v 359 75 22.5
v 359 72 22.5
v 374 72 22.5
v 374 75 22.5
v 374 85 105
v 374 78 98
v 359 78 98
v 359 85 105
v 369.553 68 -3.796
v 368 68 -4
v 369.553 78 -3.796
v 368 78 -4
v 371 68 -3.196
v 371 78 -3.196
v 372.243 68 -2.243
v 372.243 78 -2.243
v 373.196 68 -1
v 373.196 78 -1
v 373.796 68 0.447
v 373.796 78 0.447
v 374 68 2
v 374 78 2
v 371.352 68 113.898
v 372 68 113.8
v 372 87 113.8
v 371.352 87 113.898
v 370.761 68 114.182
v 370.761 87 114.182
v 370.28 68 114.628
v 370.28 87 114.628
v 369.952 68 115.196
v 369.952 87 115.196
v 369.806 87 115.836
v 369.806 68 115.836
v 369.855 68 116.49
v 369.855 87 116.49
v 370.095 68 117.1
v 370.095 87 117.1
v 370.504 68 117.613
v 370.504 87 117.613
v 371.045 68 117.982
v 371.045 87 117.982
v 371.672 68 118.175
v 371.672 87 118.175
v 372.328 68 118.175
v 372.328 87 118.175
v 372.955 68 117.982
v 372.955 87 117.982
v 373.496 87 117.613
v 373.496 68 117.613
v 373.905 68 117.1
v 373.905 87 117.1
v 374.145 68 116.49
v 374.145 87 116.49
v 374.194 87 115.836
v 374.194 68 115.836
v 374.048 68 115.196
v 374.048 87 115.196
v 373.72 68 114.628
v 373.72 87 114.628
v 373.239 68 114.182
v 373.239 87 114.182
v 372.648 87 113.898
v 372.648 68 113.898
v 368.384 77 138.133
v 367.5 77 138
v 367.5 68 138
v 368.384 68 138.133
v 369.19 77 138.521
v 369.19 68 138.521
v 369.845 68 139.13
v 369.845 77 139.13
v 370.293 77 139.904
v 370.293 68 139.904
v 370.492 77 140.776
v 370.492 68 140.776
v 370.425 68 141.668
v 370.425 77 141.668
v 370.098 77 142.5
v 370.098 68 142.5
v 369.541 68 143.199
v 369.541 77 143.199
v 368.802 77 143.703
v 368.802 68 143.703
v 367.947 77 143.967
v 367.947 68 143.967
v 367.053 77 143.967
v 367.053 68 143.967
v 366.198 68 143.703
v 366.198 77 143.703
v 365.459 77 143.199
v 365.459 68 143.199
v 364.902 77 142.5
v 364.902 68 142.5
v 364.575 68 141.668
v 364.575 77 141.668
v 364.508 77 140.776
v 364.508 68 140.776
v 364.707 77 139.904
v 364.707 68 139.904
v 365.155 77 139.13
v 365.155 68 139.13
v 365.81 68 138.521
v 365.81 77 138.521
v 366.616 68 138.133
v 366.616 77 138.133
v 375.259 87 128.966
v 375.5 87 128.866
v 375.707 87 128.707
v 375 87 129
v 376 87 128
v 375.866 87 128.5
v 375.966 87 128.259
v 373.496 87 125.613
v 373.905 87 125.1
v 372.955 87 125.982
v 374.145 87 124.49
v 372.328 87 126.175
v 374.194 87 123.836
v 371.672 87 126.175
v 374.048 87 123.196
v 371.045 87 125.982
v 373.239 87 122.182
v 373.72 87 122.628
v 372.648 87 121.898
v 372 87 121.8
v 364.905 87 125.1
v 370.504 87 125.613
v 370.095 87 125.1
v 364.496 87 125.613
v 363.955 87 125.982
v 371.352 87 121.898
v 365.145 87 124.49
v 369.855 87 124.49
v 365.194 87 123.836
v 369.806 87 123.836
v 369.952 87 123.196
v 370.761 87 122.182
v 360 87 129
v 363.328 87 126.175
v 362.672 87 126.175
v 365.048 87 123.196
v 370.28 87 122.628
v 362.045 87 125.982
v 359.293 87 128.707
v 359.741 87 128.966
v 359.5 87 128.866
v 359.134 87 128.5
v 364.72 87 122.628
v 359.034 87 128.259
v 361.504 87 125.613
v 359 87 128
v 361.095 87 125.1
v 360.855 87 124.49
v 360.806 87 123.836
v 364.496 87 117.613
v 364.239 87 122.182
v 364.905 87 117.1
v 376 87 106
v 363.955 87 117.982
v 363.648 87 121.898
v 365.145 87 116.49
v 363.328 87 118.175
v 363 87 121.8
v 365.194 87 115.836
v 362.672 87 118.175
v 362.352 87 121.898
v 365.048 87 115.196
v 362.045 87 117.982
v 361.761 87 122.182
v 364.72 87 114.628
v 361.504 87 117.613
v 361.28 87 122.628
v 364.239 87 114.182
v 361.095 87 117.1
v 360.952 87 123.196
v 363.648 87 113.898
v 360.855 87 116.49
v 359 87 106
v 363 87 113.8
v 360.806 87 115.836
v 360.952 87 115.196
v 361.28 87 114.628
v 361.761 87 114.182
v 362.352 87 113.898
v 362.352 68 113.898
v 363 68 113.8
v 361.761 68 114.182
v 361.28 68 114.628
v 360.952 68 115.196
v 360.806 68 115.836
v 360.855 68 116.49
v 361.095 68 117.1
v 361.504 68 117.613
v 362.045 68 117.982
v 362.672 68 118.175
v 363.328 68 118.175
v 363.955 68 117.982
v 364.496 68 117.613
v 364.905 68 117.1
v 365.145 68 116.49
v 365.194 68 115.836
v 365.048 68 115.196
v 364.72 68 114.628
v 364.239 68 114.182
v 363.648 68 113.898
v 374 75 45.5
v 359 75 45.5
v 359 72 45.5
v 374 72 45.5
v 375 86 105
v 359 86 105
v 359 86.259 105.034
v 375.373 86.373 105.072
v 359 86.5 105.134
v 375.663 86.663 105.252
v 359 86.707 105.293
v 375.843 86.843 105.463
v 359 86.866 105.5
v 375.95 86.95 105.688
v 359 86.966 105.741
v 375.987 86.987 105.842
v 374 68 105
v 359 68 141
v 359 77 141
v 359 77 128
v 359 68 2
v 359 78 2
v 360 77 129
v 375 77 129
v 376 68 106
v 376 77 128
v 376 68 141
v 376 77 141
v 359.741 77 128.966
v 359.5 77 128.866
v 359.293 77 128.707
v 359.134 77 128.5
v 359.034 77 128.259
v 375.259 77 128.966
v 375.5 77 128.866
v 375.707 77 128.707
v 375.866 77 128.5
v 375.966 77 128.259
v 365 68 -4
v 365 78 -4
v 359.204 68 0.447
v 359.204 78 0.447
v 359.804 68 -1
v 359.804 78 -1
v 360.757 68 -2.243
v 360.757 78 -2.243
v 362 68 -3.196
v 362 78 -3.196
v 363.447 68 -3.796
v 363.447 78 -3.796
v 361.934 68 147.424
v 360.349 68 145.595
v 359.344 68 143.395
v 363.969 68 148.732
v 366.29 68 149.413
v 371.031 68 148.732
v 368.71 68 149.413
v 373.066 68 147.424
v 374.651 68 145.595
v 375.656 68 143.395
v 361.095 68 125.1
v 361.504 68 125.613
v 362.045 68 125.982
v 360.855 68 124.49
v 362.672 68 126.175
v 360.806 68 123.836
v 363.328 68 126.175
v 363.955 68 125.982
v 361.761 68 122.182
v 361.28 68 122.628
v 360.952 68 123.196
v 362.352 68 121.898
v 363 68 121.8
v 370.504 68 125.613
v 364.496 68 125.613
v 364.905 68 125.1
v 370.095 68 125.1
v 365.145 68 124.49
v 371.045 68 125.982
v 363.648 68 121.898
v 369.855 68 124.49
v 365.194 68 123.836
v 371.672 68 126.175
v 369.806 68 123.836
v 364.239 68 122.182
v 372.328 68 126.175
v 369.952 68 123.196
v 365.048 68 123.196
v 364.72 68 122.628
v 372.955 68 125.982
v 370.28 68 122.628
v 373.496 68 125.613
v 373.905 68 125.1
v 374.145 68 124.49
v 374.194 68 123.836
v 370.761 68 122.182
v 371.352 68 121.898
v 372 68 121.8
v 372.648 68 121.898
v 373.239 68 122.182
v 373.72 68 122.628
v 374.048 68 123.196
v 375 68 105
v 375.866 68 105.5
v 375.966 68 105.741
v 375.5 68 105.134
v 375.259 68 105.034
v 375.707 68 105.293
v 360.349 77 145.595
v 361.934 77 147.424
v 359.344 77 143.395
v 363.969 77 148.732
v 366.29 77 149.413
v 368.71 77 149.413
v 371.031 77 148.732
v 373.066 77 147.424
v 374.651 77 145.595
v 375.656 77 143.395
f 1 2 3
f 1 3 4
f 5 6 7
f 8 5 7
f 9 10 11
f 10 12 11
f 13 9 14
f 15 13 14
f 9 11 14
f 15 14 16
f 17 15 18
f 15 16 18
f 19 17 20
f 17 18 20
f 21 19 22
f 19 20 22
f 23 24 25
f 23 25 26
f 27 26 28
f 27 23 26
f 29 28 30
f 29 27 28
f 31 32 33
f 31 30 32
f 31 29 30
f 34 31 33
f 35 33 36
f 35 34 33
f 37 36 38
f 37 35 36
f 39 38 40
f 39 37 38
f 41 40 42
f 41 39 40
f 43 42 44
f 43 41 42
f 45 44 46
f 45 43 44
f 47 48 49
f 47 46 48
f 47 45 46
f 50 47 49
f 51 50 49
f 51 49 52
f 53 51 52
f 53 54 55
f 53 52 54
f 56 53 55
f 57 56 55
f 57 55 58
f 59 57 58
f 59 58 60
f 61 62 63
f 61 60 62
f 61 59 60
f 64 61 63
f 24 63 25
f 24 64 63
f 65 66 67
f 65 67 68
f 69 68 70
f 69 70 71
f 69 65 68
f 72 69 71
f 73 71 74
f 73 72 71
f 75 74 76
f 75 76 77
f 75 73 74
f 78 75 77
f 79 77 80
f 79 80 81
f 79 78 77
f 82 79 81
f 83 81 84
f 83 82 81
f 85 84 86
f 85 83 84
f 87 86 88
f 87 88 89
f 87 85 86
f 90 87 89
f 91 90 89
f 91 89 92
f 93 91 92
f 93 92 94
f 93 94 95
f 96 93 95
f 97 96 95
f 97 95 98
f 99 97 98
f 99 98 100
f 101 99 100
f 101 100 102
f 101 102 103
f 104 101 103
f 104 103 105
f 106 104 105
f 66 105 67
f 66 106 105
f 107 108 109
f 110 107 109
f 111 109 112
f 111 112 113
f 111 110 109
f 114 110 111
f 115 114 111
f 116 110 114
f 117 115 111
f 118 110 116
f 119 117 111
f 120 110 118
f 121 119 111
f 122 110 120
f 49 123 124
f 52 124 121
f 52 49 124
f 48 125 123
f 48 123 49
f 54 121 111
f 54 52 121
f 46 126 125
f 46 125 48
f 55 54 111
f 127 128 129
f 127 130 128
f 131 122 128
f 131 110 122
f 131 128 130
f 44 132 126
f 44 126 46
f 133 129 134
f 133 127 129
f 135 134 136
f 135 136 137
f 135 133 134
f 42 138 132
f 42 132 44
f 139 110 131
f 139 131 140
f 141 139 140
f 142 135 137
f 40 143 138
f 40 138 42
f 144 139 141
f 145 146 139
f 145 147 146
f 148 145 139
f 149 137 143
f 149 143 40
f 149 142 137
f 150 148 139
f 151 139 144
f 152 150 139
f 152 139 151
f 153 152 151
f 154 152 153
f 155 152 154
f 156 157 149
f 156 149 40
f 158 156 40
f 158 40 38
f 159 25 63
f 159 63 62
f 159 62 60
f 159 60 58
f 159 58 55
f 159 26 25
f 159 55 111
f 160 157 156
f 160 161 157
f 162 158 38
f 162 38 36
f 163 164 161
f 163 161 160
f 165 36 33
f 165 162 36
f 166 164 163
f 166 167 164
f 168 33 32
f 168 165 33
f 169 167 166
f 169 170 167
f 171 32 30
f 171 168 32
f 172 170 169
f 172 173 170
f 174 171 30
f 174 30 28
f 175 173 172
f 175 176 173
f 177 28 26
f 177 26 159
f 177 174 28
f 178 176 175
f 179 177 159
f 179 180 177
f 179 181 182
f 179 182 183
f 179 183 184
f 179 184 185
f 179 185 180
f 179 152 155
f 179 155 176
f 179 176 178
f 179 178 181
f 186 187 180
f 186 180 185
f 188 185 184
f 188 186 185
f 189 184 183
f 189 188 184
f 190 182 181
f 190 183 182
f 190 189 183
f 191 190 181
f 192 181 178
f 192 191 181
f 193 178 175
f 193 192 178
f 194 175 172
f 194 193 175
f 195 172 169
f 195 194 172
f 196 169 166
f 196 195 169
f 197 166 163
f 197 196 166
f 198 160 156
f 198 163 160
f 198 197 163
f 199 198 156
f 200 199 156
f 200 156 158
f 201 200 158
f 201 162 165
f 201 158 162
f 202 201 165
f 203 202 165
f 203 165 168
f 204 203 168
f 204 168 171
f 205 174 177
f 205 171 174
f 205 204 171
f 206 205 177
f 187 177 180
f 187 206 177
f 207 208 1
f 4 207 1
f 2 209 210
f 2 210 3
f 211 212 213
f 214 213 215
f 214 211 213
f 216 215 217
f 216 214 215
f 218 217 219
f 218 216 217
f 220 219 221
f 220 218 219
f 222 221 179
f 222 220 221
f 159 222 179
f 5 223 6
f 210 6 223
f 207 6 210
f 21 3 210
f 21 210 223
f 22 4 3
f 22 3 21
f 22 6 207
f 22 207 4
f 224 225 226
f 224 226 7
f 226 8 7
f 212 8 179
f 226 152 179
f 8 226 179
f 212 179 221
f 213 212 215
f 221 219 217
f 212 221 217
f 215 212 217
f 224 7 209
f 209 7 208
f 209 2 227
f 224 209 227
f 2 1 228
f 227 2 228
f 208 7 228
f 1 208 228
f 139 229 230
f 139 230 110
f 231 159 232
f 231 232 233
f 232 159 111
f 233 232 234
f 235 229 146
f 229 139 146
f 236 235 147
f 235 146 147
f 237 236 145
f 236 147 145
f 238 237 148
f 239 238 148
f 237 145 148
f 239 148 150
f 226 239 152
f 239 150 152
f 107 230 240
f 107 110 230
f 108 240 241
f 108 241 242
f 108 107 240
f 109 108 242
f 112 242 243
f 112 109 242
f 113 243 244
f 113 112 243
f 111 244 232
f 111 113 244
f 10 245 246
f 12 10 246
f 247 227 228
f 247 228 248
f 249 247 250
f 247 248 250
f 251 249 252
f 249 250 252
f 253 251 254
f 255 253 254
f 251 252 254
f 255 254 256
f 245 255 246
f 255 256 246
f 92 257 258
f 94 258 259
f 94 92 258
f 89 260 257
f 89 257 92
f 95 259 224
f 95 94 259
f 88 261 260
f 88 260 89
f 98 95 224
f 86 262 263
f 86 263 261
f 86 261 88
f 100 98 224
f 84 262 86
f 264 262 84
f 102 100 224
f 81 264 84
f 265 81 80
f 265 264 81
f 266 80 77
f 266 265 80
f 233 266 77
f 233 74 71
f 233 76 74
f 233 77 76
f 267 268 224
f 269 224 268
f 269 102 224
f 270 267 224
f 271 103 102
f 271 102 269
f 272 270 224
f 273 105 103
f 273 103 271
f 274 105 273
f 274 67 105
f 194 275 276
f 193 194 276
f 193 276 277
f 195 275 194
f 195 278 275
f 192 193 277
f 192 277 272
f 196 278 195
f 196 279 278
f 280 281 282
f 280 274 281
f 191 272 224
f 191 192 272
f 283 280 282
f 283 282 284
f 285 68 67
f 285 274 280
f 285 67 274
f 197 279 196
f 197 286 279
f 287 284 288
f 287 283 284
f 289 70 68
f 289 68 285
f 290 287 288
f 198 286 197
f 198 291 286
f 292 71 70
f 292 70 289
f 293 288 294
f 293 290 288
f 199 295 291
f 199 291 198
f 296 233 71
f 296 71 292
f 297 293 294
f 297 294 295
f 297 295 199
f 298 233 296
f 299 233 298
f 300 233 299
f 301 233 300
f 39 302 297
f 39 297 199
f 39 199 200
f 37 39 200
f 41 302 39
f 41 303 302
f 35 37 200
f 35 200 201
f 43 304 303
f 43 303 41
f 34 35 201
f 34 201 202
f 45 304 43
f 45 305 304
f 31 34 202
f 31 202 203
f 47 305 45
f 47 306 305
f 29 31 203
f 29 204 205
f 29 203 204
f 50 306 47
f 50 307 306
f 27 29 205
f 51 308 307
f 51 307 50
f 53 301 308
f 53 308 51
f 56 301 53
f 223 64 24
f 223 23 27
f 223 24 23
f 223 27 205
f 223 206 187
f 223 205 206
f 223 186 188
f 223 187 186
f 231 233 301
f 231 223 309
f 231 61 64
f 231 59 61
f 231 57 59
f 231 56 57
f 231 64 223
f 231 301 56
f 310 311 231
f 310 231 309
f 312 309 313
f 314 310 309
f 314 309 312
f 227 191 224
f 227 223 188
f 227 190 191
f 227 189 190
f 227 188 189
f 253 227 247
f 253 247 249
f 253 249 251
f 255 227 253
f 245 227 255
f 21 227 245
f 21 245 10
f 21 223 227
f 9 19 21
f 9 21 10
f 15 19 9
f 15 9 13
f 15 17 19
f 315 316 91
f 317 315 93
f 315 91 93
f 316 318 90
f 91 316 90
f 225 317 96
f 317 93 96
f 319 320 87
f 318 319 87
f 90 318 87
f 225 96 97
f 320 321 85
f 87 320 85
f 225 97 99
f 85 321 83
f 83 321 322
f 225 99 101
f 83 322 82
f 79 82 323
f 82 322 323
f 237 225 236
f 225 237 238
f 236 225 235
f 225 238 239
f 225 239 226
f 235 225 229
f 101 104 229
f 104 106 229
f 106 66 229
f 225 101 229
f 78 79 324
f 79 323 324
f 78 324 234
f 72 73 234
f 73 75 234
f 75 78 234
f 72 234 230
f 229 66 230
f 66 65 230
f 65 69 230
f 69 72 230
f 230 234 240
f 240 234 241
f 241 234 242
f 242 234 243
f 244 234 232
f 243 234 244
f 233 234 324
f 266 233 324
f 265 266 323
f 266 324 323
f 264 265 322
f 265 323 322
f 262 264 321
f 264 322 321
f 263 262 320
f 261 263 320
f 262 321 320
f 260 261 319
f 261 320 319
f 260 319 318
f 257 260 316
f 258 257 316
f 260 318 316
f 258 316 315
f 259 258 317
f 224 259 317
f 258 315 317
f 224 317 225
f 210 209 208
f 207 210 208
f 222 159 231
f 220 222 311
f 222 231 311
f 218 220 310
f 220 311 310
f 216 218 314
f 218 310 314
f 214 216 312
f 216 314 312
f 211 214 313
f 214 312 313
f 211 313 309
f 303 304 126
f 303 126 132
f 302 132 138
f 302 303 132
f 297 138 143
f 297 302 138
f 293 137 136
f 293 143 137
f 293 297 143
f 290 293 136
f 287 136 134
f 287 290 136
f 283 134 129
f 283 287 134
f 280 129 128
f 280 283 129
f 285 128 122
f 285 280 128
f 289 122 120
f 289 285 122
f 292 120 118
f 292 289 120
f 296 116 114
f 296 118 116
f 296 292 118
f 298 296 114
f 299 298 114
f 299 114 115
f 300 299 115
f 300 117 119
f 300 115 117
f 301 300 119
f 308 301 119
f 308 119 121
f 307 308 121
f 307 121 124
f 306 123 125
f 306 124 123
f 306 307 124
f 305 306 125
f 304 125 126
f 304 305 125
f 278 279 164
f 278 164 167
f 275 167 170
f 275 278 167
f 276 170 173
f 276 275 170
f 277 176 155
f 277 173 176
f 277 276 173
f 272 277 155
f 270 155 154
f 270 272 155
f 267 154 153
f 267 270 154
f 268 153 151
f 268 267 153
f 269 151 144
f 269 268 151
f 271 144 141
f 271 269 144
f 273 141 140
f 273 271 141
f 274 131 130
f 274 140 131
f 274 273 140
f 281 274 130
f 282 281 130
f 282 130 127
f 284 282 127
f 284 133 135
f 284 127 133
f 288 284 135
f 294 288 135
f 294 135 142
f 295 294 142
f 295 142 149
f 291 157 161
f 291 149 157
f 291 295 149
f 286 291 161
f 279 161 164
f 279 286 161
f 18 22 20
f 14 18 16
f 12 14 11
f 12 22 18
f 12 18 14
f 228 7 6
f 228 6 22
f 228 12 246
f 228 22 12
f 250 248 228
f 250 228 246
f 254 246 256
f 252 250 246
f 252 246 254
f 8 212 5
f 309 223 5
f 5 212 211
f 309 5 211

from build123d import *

# Parameters (mm, degrees)
CYLINDER029_R          = 2.2
CYLINDER029_DEPTH      = 26
CYLINDER029_ROLL_ANGLE = -90
ARRAY001_X_COUNT       = 2
ARRAY001_X_PITCH       = 8
ARRAY001_Z_COUNT       = 2
ARRAY001_Z_PITCH       = 9
BOX015_W               = 23
BOX015_H               = 3
BOX015_DEPTH           = 20
BOX011_W               = 130
BOX011_H               = 10
BOX011_DEPTH           = 15
SKETCH003_R            = 3
PAD003_DEPTH           = 9
FILLET003_R            = 1
BOX013_W               = 24
BOX013_H               = 10
BOX013_DEPTH           = 17
FILLET_R               = 1
CHAMFER_SIZE           = 7
FILLET004_R            = 6
FILLET004_PITCH_ANGLE  = 90


with BuildPart() as taladros_suje_traccion:
    # Cylinder029 → Cylinder029 (new body)
    with BuildSketch(Plane.XY):
        Circle(CYLINDER029_R)
    extrude(amount=CYLINDER029_DEPTH)


with BuildPart() as taladros_suje_traccion_1:
    # Cylinder029 roll: moved
    add(taladros_suje_traccion.part.rotate(Axis((0, 0, 0), (1, 0, 0)), CYLINDER029_ROLL_ANGLE))


with BuildPart() as taladros_suje_traccion_2:
    # Cylinder029 placement: moved
    add(taladros_suje_traccion_1.part.moved(Location((202, 0, 4))))

    # Array001 X: Taladros_suje_traccion ×2


with BuildPart() as taladros_suje_traccion_3:
    add(taladros_suje_traccion_2.part)
    with Locations(*[(i * ARRAY001_X_PITCH, 0, 0) for i in range(1, ARRAY001_X_COUNT)]):
        add(taladros_suje_traccion_2.part)

    # Array001 Z: Taladros_suje_traccion ×2


with BuildPart() as taladros_suje_traccion_4:
    add(taladros_suje_traccion_3.part)
    with Locations(*[(0, 0, i * ARRAY001_Z_PITCH) for i in range(1, ARRAY001_Z_COUNT)]):
        add(taladros_suje_traccion_3.part)


with BuildPart() as agarre1:
    # Box015 → Box015 (new body)
    with BuildSketch(Plane(origin=(280.5, 5, 0), x_dir=(1, 0, 0), z_dir=(0, 0, 1))):
        with Locations((11.5, 1.5)):
            Rectangle(BOX015_W, BOX015_H)
    extrude(amount=BOX015_DEPTH)


with BuildPart() as base_tibia:
    # Box011 → Box011 (new body)
    with BuildSketch(Plane(origin=(200, 1.5, 0), x_dir=(1, 0, 0), z_dir=(0, 0, 1))):
        with Locations((65, 5)):
            Rectangle(BOX011_W, BOX011_H)
    extrude(amount=BOX011_DEPTH)


with BuildPart() as tibia_agarre:
    # Sketch003 → Pad003 (new body)
    with BuildSketch(Plane(origin=(221, 10.5, 0), x_dir=(1, 0, 0), z_dir=(0, -1, 0))):
        with BuildLine():
            Line((0, 17), (-36, 17))
            ThreePointArc((-36, 17), (-44.500015, 8.5), (-36, 0))
            Line((-36, 0), (0, 0))
            Line((0, 0), (0, 17))
        make_face()
        with Locations((-36.000015, 8.5)):
            Circle(SKETCH003_R, mode=Mode.SUBTRACT)
    extrude(amount=PAD003_DEPTH)

    # Fillet003
    fillet003_edges = [tibia_agarre.edges().sort_by_distance(p)[0] for p in [
        (221, 6, 17),
        (221, 6, 0),
    ]]
    fillet(fillet003_edges, radius=FILLET003_R)

    # Fusion008: union Base_tibia
    add(base_tibia.part)


with BuildPart() as tibia_agarre_1:
    # Fusion008 placement: moved
    add(tibia_agarre.part.moved(Location((0, -0.5, 0))))

    # Cut010: cut Agarre1
    add(agarre1.part, mode=Mode.SUBTRACT)


with BuildPart() as tibia_redondeada:
    # Box013 → Box013 (new body)
    with BuildSketch(Plane(origin=(197, 10, 0), x_dir=(1, 0, 0), z_dir=(0, 0, 1))):
        with Locations((12, 5)):
            Rectangle(BOX013_W, BOX013_H)
    extrude(amount=BOX013_DEPTH)

    # Fillet
    fillet_edges = [tibia_redondeada.edges().sort_by_distance(p)[0] for p in [
        (197, 15, 17),
        (197, 15, 0),
        (221, 15, 17),
        (221, 20, 8.5),
    ]]
    fillet(fillet_edges, radius=FILLET_R)

    # Fusion009003008: union Tibia_agarre
    add(tibia_agarre_1.part)

    # Chamfer
    chamfer_edges = [tibia_redondeada.edges().sort_by_distance(p)[0] for p in [
        (221, 11, 7.5),
    ]]
    chamfer(chamfer_edges, length=CHAMFER_SIZE)

    # Cut011: cut Taladros_suje_traccion
    add(taladros_suje_traccion_4.part, mode=Mode.SUBTRACT)

    # Fillet004
    fillet004_edges = [tibia_redondeada.edges().sort_by_distance(p)[0] for p in [
        (330, 6, 0),
        (330, 6, 15),
    ]]
    fillet(fillet004_edges, radius=FILLET004_R)


with BuildPart() as tibia_redondeada_1:
    # Fillet004 pitch: moved
    add(tibia_redondeada.part.rotate(Axis((0, 0, 0), (0, 1, 0)), FILLET004_PITCH_ANGLE))


with BuildPart() as tibia_redondeada_2:
    # Fillet004 placement: moved
    add(tibia_redondeada_1.part.moved(Location((359, 67, 326))))


solid = tibia_redondeada_2.part
